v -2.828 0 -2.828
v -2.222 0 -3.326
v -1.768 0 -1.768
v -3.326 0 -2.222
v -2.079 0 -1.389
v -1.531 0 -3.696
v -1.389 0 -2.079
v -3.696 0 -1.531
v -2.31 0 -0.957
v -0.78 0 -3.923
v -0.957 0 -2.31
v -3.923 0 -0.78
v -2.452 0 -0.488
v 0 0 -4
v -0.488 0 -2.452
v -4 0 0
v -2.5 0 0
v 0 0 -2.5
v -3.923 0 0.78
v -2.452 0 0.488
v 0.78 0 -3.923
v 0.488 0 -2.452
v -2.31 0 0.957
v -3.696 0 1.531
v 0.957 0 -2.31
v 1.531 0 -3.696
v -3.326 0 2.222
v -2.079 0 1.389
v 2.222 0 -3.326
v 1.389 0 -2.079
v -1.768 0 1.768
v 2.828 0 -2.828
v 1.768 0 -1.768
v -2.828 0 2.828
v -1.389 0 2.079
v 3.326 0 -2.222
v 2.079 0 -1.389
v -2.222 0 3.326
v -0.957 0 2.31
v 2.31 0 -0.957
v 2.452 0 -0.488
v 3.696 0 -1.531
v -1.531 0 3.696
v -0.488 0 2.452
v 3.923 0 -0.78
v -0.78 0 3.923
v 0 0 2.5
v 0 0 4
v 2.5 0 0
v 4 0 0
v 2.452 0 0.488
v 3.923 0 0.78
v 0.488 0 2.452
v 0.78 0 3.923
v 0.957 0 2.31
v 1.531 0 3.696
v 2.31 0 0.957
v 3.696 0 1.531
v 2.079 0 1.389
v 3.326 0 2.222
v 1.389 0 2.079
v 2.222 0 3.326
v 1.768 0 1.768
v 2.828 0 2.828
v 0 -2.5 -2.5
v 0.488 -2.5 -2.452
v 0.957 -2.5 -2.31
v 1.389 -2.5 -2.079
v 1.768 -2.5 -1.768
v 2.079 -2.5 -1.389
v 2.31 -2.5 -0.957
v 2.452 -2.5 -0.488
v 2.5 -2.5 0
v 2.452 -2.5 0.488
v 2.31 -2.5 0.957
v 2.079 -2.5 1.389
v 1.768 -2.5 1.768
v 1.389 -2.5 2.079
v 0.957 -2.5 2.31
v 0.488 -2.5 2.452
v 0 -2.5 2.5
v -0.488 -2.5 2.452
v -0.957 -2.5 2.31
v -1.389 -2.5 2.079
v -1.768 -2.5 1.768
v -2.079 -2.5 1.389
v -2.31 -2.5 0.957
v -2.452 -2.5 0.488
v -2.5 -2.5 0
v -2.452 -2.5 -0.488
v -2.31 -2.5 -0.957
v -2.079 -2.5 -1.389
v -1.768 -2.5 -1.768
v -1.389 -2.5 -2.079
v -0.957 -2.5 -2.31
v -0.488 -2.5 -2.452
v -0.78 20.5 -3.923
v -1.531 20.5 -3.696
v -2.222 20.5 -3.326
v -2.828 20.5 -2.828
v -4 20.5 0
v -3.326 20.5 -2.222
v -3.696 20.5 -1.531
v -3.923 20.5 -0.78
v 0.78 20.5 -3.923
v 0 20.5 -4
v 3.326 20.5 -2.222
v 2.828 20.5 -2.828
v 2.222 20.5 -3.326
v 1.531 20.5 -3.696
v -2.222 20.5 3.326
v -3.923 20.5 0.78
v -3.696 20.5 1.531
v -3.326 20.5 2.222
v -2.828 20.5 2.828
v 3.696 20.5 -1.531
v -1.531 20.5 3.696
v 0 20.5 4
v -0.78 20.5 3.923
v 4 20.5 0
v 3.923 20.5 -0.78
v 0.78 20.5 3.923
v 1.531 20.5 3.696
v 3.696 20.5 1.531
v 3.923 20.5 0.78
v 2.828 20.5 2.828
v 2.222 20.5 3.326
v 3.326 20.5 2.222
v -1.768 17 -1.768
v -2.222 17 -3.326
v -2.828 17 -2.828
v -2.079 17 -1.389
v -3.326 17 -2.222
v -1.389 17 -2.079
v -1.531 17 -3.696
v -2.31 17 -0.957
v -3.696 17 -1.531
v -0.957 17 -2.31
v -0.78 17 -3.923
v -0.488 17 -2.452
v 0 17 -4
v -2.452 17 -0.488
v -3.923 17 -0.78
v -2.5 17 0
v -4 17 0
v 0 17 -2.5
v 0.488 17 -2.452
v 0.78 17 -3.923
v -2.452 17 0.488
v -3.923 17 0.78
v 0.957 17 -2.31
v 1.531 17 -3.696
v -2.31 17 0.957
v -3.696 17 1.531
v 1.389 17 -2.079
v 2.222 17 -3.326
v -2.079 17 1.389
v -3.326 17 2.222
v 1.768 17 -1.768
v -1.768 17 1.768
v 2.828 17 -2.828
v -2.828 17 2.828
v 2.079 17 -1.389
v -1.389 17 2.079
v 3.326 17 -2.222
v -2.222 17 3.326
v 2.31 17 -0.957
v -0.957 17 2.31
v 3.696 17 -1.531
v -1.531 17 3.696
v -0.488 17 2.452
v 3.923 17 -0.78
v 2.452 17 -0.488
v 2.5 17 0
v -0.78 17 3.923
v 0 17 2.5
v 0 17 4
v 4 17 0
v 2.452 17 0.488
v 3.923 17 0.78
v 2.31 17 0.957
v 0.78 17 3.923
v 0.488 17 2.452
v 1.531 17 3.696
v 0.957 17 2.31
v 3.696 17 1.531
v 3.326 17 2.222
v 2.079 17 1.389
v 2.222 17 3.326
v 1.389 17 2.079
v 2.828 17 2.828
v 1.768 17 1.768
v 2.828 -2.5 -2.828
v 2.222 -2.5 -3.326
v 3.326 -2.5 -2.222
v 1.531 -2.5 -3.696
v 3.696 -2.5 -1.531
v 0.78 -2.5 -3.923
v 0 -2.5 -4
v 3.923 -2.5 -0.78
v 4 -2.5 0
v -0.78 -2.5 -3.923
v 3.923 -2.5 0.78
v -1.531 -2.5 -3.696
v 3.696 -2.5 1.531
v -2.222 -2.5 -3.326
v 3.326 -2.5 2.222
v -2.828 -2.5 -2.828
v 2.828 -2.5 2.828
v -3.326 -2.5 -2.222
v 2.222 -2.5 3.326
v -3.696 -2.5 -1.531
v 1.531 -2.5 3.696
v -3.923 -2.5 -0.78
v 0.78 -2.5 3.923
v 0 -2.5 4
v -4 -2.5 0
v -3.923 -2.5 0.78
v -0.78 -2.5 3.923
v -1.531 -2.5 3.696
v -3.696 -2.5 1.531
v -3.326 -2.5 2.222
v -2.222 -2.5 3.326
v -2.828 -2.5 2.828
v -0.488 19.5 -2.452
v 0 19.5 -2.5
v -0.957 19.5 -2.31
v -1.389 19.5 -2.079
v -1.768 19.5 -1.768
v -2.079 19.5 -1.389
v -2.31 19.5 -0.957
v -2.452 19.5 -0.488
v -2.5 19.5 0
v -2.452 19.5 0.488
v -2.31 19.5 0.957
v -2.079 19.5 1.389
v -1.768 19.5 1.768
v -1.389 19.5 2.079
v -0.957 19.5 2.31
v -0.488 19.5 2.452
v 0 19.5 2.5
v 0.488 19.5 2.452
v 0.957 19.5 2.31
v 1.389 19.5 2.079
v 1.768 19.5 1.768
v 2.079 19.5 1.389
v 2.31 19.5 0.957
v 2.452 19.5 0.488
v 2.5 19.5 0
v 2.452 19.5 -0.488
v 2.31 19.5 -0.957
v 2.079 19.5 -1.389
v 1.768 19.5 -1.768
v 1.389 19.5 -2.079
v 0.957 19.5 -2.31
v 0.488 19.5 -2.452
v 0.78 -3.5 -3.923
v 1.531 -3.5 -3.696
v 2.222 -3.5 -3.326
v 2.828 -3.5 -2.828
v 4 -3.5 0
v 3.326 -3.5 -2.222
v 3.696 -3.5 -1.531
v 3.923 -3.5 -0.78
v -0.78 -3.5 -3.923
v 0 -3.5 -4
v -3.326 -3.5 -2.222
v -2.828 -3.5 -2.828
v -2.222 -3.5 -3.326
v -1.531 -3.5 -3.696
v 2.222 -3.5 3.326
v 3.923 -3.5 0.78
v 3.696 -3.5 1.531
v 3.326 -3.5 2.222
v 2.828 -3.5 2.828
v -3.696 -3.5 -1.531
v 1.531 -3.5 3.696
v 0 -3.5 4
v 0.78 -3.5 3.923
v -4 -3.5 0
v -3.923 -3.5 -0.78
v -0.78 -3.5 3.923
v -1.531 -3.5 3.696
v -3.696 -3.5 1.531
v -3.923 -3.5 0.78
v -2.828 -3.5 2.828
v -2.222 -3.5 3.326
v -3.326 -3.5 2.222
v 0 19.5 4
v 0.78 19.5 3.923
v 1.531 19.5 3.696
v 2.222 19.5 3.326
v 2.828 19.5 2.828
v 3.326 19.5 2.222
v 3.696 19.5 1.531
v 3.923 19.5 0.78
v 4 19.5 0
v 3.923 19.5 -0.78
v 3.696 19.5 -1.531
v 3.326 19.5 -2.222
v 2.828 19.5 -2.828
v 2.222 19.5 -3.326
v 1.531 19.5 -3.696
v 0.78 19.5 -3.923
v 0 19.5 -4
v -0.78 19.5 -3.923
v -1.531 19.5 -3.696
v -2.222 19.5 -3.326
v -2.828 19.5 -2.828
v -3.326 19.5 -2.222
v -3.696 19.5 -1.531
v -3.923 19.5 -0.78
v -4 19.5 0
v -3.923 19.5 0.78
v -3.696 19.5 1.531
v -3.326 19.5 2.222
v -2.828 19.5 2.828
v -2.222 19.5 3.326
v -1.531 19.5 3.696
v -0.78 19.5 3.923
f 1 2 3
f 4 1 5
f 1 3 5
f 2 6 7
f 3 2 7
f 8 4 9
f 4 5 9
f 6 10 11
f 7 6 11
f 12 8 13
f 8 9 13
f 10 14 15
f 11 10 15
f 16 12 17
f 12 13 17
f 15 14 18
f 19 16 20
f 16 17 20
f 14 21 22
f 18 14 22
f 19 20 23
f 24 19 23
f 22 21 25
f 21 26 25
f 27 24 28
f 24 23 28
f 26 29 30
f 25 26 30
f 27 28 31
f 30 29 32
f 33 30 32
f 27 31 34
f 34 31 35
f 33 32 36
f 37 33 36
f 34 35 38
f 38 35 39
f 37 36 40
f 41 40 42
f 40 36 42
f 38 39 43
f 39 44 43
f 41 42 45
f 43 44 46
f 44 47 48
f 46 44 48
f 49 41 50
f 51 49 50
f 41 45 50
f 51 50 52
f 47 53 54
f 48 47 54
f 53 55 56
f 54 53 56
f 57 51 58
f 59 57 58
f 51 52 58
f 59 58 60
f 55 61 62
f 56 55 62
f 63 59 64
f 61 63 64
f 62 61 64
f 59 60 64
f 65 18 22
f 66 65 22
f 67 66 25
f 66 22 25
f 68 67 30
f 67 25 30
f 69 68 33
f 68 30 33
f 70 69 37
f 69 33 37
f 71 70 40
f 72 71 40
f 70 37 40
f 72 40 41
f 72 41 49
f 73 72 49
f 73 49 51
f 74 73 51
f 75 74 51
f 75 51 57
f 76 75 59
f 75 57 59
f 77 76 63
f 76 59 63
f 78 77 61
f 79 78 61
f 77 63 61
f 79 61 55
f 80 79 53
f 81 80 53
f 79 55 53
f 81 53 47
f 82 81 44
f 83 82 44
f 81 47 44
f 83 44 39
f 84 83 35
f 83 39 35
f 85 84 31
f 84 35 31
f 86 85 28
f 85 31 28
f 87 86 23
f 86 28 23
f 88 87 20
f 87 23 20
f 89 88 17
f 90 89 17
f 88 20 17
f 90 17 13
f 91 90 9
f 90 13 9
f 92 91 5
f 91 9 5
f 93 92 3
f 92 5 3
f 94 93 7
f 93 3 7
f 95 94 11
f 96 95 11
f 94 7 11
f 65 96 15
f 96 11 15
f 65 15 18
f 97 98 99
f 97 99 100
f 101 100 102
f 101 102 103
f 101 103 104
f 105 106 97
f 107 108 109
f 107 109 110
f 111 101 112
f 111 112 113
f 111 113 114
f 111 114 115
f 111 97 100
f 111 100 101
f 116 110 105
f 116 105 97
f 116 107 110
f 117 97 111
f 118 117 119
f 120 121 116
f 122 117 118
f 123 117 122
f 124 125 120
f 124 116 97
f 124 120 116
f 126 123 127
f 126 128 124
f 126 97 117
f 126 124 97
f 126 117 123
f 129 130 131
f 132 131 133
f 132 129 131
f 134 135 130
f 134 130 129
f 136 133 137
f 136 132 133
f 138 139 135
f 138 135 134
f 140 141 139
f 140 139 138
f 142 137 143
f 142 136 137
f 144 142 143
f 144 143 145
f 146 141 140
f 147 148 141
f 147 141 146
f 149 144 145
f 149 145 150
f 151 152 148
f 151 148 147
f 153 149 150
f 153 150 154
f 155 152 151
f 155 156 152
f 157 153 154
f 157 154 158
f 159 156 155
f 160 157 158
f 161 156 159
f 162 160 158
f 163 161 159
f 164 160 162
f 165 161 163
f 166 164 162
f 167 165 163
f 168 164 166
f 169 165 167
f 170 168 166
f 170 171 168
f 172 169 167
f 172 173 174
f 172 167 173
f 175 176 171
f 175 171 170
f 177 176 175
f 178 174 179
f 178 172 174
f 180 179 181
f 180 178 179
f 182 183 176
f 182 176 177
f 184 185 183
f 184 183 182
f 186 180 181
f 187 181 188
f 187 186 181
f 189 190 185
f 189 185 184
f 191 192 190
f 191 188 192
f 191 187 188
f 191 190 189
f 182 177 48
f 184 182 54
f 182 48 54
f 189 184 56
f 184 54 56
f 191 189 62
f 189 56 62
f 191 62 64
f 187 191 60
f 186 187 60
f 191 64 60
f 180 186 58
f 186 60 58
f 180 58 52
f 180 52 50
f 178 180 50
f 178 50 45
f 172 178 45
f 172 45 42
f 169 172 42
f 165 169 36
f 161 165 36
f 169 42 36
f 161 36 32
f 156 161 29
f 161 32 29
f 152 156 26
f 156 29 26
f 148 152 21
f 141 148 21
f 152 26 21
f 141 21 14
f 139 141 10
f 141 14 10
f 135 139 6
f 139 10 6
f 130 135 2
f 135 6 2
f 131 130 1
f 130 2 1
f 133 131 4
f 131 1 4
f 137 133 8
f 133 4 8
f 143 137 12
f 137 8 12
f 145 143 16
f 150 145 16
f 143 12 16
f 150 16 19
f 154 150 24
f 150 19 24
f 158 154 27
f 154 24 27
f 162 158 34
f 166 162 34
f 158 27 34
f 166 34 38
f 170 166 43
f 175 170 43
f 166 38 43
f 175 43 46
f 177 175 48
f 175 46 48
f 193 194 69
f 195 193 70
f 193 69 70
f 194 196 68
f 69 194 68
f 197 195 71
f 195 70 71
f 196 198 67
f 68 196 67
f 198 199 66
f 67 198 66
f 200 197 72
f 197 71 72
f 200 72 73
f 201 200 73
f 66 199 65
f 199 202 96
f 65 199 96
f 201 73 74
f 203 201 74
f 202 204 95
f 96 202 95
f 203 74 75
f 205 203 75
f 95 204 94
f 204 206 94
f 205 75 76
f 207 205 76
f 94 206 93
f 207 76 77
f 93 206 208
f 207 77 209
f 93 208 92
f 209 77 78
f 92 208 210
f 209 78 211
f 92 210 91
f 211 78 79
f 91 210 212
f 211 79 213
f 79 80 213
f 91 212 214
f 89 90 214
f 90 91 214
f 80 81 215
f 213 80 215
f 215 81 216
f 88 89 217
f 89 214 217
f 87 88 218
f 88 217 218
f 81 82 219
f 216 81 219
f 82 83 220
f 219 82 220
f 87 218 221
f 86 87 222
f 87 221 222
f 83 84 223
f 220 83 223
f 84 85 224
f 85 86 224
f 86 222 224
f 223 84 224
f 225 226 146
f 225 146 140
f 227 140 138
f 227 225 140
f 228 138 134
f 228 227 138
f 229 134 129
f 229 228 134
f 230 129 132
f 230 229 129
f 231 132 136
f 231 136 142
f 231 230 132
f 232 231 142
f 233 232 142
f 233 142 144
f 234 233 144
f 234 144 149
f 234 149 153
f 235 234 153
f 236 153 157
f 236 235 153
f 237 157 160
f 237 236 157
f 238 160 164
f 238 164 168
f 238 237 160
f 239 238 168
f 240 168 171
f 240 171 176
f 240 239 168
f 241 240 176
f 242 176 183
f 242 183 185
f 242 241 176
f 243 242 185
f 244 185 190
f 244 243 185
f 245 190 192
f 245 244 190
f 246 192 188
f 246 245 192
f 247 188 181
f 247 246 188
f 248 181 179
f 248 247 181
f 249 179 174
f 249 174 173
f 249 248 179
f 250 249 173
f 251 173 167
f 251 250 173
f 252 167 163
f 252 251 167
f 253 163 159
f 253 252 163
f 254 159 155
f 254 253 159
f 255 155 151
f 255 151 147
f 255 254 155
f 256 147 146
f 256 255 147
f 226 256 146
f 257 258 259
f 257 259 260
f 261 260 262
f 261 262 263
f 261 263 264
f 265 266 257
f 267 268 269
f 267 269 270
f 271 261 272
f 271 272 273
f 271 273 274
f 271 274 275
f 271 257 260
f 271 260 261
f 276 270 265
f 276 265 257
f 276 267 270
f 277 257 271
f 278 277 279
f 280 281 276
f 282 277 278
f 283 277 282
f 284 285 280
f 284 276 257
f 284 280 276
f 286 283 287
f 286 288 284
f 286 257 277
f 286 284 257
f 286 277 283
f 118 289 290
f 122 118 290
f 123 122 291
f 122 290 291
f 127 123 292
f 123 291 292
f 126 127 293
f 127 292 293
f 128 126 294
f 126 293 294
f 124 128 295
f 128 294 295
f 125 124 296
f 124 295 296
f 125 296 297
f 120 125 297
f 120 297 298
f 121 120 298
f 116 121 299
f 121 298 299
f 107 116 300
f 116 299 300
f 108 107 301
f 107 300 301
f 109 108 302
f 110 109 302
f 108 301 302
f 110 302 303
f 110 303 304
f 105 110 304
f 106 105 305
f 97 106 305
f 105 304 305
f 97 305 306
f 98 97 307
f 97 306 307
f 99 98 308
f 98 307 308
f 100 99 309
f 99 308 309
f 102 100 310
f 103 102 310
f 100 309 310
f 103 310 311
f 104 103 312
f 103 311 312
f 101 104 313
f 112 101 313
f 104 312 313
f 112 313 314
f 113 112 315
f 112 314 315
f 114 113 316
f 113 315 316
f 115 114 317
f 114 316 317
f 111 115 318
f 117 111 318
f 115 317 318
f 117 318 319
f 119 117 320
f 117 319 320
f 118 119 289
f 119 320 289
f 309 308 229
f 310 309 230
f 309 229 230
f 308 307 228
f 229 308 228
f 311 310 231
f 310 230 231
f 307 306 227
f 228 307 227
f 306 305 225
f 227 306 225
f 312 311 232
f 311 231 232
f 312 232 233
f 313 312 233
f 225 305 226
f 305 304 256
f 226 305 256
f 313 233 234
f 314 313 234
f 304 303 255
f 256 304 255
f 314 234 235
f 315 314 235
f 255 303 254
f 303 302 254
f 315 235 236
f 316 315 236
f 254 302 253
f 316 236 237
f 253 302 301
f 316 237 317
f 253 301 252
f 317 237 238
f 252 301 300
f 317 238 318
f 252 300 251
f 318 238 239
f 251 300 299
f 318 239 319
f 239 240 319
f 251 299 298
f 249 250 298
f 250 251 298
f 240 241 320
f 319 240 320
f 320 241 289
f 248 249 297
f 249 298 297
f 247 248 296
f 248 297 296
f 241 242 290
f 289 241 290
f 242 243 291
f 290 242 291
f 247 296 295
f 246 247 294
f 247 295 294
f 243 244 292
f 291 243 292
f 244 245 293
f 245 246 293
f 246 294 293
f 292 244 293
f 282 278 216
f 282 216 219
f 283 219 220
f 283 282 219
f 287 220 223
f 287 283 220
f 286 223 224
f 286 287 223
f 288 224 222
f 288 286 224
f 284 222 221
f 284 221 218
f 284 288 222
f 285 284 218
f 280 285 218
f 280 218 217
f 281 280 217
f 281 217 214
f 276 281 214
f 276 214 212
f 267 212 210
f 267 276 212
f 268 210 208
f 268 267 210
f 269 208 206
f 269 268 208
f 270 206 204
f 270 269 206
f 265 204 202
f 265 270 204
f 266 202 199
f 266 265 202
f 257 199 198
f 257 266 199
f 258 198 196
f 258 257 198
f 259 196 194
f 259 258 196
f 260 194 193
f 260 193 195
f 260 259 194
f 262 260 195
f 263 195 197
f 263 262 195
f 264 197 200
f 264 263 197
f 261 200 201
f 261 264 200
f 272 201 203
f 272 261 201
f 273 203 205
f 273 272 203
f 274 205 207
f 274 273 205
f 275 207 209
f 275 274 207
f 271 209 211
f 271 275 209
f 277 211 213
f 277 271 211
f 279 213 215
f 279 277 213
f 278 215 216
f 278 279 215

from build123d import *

# Parameters (mm, degrees)
SKETCH1_R           = 4
BOSS_EXTRUDE1_DEPTH = 17
SKETCH2_R           = 2.5
BOSS_EXTRUDE2_DEPTH = 2.5
BOSS_EXTRUDE3_START = 1
SKETCH3_R           = 4
BOSS_EXTRUDE3_DEPTH = 1
BOSS_EXTRUDE4_START = 2.5
SKETCH4_R           = 2.5
BOSS_EXTRUDE4_DEPTH = 2.5
SKETCH5_R           = 4
BOSS_EXTRUDE5_DEPTH = 1


with BuildPart() as part:
    # Sketch1 → Boss-Extrude1 (new body)
    with BuildSketch(Plane(origin=(0, 0, 0), x_dir=(1, 0, 0), z_dir=(0, 1, 0))):
        with Locations(Location((0, 0, 0), (0, 0, 270))):
            Circle(SKETCH1_R)
    extrude(amount=BOSS_EXTRUDE1_DEPTH)

    # Sketch2 → Boss-Extrude2 (add)
    with BuildSketch(Plane.XZ):
        with Locations(Location((0, 0, 0), (0, 0, 270))):
            Circle(SKETCH2_R)
    extrude(amount=BOSS_EXTRUDE2_DEPTH)

    # Sketch3 → Boss-Extrude3 (add)
    with BuildSketch(Plane.XZ.offset(2.5).offset(BOSS_EXTRUDE3_START)):
        with Locations(Location((0, 0, 0), (0, 0, 90))):
            Circle(SKETCH3_R)
    extrude(amount=-BOSS_EXTRUDE3_DEPTH)

    # Sketch4 → Boss-Extrude4 (add)
    with BuildSketch(Plane(origin=(0, 17, 0), x_dir=(1, 0, 0), z_dir=(0, 1, 0)).offset(BOSS_EXTRUDE4_START)):
        with Locations(Location((0, 0, 0), (0, 0, 90))):
            Circle(SKETCH4_R)
    extrude(amount=-BOSS_EXTRUDE4_DEPTH)

    # Sketch5 → Boss-Extrude5 (add)
    with BuildSketch(Plane(origin=(0, 19.5, 0), x_dir=(1, 0, 0), z_dir=(0, 1, 0))):
        with Locations(Location((0, 0, 0), (0, 0, 270))):
            Circle(SKETCH5_R)
    extrude(amount=BOSS_EXTRUDE5_DEPTH)


solid = part.part
